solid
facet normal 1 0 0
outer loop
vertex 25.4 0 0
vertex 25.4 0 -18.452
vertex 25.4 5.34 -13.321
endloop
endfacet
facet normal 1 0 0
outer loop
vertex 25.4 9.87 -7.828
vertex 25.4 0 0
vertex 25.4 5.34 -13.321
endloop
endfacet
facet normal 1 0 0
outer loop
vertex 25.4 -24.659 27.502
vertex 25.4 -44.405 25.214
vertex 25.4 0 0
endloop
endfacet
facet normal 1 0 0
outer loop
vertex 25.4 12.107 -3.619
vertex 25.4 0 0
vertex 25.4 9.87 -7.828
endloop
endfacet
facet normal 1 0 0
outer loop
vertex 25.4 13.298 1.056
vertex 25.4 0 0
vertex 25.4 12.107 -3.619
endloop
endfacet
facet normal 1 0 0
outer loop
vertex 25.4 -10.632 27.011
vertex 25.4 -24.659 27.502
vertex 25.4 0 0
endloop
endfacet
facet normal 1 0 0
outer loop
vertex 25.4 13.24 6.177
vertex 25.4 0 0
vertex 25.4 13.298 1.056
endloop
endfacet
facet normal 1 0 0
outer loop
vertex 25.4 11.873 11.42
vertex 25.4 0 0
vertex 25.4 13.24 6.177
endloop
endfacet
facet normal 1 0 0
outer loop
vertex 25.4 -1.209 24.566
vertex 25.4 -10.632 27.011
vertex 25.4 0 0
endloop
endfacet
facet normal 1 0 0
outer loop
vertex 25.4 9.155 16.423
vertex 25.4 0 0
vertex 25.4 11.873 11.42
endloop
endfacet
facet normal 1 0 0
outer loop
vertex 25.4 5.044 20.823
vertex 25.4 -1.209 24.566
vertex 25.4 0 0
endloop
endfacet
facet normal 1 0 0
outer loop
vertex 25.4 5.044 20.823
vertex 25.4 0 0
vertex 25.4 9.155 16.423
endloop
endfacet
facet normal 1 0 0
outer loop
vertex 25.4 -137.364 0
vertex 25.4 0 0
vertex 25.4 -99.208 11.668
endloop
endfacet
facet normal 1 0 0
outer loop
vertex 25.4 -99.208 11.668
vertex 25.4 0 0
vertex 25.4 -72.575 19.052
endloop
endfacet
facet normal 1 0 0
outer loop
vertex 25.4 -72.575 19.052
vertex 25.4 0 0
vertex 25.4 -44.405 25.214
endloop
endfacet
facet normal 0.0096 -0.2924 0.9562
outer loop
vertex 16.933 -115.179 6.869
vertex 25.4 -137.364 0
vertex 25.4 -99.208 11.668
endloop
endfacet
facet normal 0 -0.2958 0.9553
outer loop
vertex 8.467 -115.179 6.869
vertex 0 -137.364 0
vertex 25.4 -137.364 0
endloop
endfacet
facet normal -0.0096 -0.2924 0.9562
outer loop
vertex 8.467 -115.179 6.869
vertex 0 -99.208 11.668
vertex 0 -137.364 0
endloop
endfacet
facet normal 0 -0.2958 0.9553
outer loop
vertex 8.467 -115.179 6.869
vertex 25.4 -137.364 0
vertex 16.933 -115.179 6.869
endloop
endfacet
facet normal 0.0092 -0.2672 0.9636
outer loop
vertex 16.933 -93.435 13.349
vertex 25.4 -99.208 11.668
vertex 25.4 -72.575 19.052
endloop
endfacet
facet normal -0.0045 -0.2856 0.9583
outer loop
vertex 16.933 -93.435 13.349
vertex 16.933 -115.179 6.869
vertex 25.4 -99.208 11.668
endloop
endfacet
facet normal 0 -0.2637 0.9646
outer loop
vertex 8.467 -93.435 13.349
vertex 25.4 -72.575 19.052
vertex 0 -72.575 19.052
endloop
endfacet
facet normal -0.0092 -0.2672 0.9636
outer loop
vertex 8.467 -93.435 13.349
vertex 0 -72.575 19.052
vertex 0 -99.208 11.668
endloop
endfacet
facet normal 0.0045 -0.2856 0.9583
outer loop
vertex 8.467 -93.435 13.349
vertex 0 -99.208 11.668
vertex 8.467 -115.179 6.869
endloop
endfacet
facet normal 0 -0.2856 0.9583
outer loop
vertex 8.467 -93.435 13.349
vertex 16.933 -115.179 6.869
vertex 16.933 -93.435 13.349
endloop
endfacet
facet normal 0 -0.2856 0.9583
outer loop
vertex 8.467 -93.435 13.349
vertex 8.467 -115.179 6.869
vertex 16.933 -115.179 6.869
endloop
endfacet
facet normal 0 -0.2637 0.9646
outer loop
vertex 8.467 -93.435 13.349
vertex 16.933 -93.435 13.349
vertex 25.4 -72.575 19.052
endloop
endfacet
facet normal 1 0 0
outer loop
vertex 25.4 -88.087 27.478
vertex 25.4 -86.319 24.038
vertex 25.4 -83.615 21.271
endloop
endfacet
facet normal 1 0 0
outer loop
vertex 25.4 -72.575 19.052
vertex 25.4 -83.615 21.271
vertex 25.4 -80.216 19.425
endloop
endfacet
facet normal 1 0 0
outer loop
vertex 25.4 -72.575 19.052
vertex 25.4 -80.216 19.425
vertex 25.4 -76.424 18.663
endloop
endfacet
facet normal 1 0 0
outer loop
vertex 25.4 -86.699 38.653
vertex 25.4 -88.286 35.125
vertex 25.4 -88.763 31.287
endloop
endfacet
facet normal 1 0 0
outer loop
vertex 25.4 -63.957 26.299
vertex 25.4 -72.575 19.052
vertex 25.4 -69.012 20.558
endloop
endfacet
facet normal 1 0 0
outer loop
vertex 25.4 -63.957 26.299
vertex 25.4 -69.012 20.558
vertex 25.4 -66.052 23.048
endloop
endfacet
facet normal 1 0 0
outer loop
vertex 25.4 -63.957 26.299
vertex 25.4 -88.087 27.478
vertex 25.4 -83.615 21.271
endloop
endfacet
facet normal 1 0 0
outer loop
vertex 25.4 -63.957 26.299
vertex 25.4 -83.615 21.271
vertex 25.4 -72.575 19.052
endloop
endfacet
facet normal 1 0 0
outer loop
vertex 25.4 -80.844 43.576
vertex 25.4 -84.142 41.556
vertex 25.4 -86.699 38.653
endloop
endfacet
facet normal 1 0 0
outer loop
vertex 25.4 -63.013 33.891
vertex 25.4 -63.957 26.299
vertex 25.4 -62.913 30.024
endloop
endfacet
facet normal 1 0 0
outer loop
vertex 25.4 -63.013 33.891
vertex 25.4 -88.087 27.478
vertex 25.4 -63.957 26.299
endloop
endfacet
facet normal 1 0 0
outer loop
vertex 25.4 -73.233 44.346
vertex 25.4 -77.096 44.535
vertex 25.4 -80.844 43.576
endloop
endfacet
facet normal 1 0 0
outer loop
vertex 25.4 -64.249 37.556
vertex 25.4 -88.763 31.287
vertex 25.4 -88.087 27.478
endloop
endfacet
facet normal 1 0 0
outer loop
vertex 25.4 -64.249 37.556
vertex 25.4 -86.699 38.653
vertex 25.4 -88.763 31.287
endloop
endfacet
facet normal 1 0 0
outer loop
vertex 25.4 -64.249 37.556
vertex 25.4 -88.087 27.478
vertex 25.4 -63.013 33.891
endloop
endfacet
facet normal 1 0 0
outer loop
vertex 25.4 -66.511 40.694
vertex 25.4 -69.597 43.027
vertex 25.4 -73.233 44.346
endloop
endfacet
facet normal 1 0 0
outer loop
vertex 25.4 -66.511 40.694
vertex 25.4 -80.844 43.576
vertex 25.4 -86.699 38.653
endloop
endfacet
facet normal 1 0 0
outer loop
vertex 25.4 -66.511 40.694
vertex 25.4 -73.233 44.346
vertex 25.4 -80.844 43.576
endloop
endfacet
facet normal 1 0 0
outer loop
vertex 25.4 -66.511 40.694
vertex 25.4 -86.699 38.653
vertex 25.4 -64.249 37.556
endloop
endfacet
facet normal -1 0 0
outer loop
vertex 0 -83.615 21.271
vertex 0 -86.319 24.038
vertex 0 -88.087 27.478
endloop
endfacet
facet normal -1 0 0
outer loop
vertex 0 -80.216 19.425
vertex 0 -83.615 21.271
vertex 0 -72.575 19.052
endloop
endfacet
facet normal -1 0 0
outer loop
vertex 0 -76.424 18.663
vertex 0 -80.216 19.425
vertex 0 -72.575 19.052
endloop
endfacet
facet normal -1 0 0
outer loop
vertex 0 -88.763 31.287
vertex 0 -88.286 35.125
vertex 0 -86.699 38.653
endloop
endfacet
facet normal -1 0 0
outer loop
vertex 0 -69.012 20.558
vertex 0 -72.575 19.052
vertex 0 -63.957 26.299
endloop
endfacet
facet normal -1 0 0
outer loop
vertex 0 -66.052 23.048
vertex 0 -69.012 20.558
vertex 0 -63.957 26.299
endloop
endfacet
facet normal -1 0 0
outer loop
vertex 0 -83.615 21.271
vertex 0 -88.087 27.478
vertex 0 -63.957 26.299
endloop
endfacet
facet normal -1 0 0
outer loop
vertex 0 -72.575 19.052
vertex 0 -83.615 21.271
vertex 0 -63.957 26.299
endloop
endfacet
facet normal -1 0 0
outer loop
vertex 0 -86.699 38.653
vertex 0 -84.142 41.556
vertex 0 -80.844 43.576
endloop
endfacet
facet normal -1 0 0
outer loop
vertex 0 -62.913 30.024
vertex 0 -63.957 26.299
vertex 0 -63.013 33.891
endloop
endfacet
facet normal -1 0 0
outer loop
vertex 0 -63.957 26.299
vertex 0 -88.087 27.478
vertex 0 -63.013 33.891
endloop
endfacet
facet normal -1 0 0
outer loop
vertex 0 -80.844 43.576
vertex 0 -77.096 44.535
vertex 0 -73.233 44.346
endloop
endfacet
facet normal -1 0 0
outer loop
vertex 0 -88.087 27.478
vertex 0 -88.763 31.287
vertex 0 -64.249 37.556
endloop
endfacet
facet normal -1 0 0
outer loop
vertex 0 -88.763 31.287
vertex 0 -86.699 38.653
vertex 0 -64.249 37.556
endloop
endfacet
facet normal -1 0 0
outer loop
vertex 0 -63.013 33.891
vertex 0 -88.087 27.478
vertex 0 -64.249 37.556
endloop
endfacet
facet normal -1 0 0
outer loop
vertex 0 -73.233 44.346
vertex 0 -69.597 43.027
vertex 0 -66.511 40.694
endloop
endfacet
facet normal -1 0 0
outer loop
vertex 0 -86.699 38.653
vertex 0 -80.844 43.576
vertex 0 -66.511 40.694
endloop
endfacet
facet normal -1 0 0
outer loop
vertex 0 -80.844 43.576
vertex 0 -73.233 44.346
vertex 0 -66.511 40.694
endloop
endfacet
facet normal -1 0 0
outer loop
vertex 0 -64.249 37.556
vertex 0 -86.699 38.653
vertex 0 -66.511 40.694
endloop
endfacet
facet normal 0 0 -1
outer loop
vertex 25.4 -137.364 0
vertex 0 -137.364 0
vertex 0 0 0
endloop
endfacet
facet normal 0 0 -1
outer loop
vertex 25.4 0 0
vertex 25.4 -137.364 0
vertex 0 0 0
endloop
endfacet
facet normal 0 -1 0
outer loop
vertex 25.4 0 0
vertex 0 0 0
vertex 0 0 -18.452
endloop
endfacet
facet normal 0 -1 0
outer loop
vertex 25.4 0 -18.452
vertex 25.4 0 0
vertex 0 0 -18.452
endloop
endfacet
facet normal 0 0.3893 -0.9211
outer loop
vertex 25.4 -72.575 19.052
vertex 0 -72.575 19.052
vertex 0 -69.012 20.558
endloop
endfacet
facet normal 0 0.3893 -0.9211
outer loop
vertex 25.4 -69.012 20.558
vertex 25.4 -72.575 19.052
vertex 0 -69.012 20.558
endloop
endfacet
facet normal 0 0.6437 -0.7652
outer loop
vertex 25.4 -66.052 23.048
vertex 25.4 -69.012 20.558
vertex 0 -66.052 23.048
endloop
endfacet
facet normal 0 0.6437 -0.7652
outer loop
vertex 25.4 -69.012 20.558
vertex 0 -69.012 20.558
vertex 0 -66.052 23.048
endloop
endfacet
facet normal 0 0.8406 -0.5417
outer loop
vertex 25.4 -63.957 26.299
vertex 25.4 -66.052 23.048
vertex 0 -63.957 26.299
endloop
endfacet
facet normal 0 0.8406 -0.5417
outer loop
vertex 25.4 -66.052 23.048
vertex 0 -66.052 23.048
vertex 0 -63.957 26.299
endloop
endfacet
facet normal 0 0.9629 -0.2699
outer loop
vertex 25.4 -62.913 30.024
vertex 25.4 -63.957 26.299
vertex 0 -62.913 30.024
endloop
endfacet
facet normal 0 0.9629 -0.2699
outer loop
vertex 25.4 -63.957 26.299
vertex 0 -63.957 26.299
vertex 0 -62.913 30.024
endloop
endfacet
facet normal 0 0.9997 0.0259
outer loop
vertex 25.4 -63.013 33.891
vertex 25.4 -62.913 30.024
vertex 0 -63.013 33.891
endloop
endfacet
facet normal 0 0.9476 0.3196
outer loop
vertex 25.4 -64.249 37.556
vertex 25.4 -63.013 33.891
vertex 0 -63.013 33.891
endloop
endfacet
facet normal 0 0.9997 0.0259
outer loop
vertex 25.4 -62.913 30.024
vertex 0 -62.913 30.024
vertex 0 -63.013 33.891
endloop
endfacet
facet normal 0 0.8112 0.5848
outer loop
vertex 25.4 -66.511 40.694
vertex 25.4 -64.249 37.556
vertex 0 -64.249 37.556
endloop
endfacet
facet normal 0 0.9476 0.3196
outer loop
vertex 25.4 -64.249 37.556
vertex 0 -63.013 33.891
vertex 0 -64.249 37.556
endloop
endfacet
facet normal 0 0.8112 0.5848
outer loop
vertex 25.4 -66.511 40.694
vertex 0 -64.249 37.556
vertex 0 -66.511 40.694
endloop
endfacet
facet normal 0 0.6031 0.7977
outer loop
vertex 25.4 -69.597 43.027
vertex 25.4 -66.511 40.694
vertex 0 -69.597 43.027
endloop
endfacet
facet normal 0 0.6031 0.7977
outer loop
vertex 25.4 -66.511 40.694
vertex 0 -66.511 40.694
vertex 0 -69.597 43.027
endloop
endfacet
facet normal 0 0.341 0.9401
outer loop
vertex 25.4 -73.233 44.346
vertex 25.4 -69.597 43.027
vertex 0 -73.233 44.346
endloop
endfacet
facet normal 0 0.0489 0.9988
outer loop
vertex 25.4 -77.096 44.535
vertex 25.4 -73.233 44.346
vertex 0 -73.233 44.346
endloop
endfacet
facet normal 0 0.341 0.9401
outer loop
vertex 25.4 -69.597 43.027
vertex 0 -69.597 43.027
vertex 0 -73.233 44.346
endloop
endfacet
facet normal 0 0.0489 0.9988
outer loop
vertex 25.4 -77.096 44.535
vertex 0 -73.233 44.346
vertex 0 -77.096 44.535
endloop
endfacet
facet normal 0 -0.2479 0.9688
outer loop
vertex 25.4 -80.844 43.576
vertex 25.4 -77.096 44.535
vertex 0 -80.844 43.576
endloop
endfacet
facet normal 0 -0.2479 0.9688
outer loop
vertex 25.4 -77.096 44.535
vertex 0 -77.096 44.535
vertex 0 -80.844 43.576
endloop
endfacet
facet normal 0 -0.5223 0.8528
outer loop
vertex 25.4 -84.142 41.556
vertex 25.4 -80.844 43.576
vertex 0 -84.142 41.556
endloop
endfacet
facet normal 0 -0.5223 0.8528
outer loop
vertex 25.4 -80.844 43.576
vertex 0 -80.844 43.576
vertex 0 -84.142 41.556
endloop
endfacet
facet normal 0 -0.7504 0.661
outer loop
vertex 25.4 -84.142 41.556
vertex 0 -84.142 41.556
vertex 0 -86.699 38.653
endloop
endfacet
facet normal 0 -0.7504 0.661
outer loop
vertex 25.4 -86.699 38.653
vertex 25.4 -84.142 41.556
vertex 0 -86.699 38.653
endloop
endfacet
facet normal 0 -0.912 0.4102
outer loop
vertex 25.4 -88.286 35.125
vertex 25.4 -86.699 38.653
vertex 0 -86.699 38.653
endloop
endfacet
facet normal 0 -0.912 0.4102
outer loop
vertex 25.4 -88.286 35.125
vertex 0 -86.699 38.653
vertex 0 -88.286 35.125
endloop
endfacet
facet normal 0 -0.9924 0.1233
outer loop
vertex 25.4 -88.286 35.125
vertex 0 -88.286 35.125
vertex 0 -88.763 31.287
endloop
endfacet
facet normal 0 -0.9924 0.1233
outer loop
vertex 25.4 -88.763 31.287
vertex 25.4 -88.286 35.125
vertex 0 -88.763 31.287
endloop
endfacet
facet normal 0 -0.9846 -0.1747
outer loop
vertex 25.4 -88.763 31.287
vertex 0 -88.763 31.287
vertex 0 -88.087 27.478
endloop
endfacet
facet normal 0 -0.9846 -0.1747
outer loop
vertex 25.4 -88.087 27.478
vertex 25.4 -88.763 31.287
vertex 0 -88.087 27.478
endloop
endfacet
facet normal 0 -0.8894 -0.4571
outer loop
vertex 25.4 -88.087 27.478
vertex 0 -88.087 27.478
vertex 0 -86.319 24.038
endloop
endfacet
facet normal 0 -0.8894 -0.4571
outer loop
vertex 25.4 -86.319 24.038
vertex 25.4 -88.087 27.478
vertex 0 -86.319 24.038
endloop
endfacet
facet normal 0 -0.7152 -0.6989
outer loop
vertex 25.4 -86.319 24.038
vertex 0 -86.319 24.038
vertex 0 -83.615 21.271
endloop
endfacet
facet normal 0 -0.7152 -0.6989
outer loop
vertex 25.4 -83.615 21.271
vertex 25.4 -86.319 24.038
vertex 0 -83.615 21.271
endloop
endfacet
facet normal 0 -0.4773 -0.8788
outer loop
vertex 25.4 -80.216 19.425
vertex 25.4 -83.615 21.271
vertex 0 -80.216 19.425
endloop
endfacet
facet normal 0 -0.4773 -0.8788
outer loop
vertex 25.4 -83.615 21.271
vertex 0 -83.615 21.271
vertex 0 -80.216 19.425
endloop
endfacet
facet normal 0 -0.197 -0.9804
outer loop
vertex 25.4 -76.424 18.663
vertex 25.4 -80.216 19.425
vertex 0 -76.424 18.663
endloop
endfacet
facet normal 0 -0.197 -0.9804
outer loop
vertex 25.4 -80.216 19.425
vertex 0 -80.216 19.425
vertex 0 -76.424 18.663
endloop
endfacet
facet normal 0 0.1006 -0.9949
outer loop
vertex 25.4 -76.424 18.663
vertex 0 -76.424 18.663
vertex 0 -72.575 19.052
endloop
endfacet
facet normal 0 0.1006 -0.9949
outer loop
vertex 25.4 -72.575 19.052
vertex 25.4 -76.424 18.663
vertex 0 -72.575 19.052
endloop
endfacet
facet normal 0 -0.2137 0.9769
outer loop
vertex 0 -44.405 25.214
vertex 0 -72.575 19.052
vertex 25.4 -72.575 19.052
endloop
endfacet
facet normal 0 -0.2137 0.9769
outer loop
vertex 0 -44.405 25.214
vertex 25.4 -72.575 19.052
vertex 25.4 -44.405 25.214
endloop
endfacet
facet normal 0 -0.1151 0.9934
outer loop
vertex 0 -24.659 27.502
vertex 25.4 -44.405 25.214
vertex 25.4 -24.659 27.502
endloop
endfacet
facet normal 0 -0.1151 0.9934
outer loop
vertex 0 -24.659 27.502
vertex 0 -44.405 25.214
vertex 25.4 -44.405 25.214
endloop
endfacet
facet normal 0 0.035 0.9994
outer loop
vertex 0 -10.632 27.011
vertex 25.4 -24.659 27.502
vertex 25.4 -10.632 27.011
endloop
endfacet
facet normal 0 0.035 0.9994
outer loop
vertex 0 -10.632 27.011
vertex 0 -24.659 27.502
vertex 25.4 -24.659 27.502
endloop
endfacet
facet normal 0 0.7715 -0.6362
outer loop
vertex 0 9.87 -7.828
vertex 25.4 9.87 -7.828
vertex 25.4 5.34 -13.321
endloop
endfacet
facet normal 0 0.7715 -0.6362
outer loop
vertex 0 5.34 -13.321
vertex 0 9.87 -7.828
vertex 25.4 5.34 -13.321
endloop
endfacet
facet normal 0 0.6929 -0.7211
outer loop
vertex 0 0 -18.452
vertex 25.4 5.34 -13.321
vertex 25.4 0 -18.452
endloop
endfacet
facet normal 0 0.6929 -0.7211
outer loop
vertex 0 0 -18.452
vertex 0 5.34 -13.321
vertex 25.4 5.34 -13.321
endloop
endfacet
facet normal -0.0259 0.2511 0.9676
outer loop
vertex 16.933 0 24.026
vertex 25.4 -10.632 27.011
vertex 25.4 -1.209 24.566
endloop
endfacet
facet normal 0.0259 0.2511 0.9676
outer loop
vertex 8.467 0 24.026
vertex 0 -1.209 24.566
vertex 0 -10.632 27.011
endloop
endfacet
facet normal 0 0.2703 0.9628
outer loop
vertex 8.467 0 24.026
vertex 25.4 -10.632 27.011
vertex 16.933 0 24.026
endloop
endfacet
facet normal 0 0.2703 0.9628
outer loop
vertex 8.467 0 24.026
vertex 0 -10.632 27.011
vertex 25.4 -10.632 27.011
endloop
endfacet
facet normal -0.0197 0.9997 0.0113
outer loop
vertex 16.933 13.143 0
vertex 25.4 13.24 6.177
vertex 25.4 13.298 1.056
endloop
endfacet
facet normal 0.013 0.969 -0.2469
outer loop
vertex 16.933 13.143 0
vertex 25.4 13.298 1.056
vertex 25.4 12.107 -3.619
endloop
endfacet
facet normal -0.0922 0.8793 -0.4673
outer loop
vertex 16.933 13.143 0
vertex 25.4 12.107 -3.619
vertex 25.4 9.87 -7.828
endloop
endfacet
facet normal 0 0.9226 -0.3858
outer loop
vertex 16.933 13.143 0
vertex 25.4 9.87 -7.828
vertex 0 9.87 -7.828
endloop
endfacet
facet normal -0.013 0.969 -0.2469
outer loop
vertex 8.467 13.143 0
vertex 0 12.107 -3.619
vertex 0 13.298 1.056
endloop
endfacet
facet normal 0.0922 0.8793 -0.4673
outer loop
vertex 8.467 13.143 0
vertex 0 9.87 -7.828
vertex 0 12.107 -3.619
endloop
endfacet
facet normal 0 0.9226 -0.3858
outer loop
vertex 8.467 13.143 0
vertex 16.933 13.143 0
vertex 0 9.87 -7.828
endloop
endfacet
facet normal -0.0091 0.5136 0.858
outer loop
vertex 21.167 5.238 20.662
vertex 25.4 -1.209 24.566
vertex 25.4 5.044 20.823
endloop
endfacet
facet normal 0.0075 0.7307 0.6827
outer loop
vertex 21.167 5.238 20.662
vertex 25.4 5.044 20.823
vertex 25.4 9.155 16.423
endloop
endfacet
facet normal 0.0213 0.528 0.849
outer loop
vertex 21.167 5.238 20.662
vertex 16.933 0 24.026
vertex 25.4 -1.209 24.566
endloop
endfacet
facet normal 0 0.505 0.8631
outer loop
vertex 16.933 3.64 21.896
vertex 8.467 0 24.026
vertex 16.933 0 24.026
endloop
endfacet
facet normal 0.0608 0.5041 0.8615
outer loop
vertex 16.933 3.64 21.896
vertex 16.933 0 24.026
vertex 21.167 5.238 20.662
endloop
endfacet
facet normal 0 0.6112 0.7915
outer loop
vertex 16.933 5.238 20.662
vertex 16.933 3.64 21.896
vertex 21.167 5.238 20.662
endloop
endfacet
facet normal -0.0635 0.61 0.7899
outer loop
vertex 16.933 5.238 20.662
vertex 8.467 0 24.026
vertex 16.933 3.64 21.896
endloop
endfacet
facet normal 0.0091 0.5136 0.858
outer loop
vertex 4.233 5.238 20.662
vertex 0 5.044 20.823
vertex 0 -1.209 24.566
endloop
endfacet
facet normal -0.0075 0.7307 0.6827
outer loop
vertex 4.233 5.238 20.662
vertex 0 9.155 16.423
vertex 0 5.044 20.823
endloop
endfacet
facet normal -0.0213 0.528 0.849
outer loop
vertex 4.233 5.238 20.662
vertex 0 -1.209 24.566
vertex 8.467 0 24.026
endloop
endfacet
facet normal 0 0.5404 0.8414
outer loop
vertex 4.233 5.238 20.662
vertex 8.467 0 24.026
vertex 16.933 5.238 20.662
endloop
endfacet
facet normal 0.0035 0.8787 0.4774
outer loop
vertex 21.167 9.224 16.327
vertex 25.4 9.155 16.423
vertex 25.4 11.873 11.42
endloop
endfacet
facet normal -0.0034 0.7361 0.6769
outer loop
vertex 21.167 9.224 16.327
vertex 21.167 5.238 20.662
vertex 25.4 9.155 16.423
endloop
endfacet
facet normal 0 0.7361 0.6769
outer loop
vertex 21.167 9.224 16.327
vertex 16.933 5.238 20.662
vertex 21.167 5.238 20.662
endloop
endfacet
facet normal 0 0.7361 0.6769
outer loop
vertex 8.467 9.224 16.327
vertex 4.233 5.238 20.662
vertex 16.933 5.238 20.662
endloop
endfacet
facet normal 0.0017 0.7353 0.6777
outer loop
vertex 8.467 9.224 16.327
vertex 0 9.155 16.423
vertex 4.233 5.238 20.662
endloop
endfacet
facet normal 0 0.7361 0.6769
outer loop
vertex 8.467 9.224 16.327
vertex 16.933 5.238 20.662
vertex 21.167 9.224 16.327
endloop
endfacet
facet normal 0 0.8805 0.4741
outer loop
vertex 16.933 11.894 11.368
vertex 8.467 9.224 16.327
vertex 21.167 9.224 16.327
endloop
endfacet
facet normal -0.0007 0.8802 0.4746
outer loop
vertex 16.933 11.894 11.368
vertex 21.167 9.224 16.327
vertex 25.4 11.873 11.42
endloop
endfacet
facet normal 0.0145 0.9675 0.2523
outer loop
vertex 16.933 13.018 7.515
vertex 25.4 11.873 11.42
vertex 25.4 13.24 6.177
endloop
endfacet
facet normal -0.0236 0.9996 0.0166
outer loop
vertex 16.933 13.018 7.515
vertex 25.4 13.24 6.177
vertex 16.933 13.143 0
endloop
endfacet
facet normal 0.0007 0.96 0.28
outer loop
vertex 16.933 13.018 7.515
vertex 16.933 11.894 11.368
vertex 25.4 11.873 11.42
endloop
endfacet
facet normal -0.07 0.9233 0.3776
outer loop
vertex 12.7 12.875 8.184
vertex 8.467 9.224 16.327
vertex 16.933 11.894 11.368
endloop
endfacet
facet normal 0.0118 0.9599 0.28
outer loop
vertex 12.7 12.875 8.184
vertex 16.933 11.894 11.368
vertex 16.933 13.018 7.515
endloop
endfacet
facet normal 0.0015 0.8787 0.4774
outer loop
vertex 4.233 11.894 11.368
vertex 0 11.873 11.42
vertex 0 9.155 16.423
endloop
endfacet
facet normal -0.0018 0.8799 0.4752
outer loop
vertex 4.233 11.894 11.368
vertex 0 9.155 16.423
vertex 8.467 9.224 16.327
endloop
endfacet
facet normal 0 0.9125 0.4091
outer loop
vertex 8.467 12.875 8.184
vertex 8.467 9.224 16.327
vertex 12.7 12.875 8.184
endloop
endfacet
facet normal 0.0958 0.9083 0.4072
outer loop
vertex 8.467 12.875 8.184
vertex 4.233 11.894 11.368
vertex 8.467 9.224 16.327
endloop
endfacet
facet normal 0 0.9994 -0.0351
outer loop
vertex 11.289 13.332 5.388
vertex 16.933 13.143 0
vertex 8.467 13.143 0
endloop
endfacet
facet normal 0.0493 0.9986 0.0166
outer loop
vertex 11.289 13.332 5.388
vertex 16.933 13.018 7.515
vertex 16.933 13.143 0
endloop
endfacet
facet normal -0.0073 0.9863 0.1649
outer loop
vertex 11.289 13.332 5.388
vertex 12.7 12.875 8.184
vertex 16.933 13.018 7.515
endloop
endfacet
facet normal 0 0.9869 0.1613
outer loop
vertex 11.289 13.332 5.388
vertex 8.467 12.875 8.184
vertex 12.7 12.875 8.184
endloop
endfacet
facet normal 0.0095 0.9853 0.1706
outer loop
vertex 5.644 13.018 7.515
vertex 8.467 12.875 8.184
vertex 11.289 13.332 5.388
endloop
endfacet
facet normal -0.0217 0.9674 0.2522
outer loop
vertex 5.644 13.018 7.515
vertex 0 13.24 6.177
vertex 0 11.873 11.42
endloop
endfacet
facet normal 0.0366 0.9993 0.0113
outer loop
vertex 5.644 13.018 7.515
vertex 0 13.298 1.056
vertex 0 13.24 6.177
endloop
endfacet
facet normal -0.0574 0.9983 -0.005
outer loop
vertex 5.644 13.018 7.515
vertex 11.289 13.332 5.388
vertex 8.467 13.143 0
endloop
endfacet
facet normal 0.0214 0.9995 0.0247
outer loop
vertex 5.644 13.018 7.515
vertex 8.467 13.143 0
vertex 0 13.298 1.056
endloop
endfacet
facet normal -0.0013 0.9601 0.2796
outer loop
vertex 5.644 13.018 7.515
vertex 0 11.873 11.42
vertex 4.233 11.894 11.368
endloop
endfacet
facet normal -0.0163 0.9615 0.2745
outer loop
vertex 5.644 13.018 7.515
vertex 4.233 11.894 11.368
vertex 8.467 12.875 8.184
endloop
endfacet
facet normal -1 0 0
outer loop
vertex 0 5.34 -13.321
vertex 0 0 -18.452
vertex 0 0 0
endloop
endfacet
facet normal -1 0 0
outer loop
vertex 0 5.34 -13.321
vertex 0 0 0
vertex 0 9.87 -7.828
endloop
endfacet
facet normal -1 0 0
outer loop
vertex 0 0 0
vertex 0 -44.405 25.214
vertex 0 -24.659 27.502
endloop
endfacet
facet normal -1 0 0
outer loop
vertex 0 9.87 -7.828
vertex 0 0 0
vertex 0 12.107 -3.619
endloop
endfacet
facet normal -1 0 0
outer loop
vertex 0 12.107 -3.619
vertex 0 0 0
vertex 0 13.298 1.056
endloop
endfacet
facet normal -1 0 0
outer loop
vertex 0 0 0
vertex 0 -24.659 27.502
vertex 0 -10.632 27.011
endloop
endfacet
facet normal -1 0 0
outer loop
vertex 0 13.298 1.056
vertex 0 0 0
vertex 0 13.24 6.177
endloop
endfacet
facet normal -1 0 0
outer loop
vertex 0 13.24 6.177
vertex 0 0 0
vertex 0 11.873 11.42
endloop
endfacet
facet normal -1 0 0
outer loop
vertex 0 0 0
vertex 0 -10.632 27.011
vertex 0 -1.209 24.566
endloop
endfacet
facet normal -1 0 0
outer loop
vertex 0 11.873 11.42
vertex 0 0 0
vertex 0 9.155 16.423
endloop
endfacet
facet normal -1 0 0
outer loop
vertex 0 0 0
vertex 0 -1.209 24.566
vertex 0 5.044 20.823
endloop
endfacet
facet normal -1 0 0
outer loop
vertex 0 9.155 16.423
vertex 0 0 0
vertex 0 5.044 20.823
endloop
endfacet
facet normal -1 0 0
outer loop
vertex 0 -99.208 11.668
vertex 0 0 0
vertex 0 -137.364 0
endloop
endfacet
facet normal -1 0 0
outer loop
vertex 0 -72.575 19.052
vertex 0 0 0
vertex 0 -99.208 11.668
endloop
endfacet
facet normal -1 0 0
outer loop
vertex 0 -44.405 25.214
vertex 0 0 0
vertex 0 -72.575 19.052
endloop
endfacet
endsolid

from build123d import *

# Parameters (mm, degrees)
F1_DEPTH = 25.4


with BuildPart() as f1:
    # F0 (on Right) → F1 (new body)
    with BuildSketch(Plane.YZ):
        with BuildLine():
            ThreePointArc((-62.8138756842, 31.6238140479), (-86.040473753, 39.5821181051), (-72.5751516627, 19.0517853674))
            ThreePointArc((-72.5751516627, 19.0517853674), (-65.540689283, 23.6655099906), (-62.8138756842, 31.6238140479))
        make_face()
    extrude(amount=F1_DEPTH)


with BuildPart() as f1b:
    # F0 (on Right) → F1, piece 2 (new body)
    with BuildSketch(Plane.YZ):
        with BuildLine():
            Line((-137.3635530472, 0), (0, 0))
            Line((0, 0), (0, -18.4522196651))
            add(Edge.make_bspline(
                [(-72.5751516627, 19.0517853674), (-41.129977007, 27.0942238326), (4.9676671648, 33.7227569234), (18.3033239725, -1.5009866519), (5.9052848096, -12.9831661222), (0, -18.4522196651)],
                knots=[0.212311344, 0.212311344, 0.212311344, 0.212311344, 0.541649679, 0.7816840911, 1, 1, 1, 1], degree=3))
            add(Edge.make_bspline(
                [(-137.3635530472, 0), (-115.1050799378, 6.9335723587), (-92.8466068284, 13.8671447173), (-72.5751516627, 19.0517853674)],
                knots=[0, 0, 0, 0, 0.212311344, 0.212311344, 0.212311344, 0.212311344], degree=3))
        make_face()
    extrude(amount=F1_DEPTH)


solid = Compound([f1.part, f1b.part])
